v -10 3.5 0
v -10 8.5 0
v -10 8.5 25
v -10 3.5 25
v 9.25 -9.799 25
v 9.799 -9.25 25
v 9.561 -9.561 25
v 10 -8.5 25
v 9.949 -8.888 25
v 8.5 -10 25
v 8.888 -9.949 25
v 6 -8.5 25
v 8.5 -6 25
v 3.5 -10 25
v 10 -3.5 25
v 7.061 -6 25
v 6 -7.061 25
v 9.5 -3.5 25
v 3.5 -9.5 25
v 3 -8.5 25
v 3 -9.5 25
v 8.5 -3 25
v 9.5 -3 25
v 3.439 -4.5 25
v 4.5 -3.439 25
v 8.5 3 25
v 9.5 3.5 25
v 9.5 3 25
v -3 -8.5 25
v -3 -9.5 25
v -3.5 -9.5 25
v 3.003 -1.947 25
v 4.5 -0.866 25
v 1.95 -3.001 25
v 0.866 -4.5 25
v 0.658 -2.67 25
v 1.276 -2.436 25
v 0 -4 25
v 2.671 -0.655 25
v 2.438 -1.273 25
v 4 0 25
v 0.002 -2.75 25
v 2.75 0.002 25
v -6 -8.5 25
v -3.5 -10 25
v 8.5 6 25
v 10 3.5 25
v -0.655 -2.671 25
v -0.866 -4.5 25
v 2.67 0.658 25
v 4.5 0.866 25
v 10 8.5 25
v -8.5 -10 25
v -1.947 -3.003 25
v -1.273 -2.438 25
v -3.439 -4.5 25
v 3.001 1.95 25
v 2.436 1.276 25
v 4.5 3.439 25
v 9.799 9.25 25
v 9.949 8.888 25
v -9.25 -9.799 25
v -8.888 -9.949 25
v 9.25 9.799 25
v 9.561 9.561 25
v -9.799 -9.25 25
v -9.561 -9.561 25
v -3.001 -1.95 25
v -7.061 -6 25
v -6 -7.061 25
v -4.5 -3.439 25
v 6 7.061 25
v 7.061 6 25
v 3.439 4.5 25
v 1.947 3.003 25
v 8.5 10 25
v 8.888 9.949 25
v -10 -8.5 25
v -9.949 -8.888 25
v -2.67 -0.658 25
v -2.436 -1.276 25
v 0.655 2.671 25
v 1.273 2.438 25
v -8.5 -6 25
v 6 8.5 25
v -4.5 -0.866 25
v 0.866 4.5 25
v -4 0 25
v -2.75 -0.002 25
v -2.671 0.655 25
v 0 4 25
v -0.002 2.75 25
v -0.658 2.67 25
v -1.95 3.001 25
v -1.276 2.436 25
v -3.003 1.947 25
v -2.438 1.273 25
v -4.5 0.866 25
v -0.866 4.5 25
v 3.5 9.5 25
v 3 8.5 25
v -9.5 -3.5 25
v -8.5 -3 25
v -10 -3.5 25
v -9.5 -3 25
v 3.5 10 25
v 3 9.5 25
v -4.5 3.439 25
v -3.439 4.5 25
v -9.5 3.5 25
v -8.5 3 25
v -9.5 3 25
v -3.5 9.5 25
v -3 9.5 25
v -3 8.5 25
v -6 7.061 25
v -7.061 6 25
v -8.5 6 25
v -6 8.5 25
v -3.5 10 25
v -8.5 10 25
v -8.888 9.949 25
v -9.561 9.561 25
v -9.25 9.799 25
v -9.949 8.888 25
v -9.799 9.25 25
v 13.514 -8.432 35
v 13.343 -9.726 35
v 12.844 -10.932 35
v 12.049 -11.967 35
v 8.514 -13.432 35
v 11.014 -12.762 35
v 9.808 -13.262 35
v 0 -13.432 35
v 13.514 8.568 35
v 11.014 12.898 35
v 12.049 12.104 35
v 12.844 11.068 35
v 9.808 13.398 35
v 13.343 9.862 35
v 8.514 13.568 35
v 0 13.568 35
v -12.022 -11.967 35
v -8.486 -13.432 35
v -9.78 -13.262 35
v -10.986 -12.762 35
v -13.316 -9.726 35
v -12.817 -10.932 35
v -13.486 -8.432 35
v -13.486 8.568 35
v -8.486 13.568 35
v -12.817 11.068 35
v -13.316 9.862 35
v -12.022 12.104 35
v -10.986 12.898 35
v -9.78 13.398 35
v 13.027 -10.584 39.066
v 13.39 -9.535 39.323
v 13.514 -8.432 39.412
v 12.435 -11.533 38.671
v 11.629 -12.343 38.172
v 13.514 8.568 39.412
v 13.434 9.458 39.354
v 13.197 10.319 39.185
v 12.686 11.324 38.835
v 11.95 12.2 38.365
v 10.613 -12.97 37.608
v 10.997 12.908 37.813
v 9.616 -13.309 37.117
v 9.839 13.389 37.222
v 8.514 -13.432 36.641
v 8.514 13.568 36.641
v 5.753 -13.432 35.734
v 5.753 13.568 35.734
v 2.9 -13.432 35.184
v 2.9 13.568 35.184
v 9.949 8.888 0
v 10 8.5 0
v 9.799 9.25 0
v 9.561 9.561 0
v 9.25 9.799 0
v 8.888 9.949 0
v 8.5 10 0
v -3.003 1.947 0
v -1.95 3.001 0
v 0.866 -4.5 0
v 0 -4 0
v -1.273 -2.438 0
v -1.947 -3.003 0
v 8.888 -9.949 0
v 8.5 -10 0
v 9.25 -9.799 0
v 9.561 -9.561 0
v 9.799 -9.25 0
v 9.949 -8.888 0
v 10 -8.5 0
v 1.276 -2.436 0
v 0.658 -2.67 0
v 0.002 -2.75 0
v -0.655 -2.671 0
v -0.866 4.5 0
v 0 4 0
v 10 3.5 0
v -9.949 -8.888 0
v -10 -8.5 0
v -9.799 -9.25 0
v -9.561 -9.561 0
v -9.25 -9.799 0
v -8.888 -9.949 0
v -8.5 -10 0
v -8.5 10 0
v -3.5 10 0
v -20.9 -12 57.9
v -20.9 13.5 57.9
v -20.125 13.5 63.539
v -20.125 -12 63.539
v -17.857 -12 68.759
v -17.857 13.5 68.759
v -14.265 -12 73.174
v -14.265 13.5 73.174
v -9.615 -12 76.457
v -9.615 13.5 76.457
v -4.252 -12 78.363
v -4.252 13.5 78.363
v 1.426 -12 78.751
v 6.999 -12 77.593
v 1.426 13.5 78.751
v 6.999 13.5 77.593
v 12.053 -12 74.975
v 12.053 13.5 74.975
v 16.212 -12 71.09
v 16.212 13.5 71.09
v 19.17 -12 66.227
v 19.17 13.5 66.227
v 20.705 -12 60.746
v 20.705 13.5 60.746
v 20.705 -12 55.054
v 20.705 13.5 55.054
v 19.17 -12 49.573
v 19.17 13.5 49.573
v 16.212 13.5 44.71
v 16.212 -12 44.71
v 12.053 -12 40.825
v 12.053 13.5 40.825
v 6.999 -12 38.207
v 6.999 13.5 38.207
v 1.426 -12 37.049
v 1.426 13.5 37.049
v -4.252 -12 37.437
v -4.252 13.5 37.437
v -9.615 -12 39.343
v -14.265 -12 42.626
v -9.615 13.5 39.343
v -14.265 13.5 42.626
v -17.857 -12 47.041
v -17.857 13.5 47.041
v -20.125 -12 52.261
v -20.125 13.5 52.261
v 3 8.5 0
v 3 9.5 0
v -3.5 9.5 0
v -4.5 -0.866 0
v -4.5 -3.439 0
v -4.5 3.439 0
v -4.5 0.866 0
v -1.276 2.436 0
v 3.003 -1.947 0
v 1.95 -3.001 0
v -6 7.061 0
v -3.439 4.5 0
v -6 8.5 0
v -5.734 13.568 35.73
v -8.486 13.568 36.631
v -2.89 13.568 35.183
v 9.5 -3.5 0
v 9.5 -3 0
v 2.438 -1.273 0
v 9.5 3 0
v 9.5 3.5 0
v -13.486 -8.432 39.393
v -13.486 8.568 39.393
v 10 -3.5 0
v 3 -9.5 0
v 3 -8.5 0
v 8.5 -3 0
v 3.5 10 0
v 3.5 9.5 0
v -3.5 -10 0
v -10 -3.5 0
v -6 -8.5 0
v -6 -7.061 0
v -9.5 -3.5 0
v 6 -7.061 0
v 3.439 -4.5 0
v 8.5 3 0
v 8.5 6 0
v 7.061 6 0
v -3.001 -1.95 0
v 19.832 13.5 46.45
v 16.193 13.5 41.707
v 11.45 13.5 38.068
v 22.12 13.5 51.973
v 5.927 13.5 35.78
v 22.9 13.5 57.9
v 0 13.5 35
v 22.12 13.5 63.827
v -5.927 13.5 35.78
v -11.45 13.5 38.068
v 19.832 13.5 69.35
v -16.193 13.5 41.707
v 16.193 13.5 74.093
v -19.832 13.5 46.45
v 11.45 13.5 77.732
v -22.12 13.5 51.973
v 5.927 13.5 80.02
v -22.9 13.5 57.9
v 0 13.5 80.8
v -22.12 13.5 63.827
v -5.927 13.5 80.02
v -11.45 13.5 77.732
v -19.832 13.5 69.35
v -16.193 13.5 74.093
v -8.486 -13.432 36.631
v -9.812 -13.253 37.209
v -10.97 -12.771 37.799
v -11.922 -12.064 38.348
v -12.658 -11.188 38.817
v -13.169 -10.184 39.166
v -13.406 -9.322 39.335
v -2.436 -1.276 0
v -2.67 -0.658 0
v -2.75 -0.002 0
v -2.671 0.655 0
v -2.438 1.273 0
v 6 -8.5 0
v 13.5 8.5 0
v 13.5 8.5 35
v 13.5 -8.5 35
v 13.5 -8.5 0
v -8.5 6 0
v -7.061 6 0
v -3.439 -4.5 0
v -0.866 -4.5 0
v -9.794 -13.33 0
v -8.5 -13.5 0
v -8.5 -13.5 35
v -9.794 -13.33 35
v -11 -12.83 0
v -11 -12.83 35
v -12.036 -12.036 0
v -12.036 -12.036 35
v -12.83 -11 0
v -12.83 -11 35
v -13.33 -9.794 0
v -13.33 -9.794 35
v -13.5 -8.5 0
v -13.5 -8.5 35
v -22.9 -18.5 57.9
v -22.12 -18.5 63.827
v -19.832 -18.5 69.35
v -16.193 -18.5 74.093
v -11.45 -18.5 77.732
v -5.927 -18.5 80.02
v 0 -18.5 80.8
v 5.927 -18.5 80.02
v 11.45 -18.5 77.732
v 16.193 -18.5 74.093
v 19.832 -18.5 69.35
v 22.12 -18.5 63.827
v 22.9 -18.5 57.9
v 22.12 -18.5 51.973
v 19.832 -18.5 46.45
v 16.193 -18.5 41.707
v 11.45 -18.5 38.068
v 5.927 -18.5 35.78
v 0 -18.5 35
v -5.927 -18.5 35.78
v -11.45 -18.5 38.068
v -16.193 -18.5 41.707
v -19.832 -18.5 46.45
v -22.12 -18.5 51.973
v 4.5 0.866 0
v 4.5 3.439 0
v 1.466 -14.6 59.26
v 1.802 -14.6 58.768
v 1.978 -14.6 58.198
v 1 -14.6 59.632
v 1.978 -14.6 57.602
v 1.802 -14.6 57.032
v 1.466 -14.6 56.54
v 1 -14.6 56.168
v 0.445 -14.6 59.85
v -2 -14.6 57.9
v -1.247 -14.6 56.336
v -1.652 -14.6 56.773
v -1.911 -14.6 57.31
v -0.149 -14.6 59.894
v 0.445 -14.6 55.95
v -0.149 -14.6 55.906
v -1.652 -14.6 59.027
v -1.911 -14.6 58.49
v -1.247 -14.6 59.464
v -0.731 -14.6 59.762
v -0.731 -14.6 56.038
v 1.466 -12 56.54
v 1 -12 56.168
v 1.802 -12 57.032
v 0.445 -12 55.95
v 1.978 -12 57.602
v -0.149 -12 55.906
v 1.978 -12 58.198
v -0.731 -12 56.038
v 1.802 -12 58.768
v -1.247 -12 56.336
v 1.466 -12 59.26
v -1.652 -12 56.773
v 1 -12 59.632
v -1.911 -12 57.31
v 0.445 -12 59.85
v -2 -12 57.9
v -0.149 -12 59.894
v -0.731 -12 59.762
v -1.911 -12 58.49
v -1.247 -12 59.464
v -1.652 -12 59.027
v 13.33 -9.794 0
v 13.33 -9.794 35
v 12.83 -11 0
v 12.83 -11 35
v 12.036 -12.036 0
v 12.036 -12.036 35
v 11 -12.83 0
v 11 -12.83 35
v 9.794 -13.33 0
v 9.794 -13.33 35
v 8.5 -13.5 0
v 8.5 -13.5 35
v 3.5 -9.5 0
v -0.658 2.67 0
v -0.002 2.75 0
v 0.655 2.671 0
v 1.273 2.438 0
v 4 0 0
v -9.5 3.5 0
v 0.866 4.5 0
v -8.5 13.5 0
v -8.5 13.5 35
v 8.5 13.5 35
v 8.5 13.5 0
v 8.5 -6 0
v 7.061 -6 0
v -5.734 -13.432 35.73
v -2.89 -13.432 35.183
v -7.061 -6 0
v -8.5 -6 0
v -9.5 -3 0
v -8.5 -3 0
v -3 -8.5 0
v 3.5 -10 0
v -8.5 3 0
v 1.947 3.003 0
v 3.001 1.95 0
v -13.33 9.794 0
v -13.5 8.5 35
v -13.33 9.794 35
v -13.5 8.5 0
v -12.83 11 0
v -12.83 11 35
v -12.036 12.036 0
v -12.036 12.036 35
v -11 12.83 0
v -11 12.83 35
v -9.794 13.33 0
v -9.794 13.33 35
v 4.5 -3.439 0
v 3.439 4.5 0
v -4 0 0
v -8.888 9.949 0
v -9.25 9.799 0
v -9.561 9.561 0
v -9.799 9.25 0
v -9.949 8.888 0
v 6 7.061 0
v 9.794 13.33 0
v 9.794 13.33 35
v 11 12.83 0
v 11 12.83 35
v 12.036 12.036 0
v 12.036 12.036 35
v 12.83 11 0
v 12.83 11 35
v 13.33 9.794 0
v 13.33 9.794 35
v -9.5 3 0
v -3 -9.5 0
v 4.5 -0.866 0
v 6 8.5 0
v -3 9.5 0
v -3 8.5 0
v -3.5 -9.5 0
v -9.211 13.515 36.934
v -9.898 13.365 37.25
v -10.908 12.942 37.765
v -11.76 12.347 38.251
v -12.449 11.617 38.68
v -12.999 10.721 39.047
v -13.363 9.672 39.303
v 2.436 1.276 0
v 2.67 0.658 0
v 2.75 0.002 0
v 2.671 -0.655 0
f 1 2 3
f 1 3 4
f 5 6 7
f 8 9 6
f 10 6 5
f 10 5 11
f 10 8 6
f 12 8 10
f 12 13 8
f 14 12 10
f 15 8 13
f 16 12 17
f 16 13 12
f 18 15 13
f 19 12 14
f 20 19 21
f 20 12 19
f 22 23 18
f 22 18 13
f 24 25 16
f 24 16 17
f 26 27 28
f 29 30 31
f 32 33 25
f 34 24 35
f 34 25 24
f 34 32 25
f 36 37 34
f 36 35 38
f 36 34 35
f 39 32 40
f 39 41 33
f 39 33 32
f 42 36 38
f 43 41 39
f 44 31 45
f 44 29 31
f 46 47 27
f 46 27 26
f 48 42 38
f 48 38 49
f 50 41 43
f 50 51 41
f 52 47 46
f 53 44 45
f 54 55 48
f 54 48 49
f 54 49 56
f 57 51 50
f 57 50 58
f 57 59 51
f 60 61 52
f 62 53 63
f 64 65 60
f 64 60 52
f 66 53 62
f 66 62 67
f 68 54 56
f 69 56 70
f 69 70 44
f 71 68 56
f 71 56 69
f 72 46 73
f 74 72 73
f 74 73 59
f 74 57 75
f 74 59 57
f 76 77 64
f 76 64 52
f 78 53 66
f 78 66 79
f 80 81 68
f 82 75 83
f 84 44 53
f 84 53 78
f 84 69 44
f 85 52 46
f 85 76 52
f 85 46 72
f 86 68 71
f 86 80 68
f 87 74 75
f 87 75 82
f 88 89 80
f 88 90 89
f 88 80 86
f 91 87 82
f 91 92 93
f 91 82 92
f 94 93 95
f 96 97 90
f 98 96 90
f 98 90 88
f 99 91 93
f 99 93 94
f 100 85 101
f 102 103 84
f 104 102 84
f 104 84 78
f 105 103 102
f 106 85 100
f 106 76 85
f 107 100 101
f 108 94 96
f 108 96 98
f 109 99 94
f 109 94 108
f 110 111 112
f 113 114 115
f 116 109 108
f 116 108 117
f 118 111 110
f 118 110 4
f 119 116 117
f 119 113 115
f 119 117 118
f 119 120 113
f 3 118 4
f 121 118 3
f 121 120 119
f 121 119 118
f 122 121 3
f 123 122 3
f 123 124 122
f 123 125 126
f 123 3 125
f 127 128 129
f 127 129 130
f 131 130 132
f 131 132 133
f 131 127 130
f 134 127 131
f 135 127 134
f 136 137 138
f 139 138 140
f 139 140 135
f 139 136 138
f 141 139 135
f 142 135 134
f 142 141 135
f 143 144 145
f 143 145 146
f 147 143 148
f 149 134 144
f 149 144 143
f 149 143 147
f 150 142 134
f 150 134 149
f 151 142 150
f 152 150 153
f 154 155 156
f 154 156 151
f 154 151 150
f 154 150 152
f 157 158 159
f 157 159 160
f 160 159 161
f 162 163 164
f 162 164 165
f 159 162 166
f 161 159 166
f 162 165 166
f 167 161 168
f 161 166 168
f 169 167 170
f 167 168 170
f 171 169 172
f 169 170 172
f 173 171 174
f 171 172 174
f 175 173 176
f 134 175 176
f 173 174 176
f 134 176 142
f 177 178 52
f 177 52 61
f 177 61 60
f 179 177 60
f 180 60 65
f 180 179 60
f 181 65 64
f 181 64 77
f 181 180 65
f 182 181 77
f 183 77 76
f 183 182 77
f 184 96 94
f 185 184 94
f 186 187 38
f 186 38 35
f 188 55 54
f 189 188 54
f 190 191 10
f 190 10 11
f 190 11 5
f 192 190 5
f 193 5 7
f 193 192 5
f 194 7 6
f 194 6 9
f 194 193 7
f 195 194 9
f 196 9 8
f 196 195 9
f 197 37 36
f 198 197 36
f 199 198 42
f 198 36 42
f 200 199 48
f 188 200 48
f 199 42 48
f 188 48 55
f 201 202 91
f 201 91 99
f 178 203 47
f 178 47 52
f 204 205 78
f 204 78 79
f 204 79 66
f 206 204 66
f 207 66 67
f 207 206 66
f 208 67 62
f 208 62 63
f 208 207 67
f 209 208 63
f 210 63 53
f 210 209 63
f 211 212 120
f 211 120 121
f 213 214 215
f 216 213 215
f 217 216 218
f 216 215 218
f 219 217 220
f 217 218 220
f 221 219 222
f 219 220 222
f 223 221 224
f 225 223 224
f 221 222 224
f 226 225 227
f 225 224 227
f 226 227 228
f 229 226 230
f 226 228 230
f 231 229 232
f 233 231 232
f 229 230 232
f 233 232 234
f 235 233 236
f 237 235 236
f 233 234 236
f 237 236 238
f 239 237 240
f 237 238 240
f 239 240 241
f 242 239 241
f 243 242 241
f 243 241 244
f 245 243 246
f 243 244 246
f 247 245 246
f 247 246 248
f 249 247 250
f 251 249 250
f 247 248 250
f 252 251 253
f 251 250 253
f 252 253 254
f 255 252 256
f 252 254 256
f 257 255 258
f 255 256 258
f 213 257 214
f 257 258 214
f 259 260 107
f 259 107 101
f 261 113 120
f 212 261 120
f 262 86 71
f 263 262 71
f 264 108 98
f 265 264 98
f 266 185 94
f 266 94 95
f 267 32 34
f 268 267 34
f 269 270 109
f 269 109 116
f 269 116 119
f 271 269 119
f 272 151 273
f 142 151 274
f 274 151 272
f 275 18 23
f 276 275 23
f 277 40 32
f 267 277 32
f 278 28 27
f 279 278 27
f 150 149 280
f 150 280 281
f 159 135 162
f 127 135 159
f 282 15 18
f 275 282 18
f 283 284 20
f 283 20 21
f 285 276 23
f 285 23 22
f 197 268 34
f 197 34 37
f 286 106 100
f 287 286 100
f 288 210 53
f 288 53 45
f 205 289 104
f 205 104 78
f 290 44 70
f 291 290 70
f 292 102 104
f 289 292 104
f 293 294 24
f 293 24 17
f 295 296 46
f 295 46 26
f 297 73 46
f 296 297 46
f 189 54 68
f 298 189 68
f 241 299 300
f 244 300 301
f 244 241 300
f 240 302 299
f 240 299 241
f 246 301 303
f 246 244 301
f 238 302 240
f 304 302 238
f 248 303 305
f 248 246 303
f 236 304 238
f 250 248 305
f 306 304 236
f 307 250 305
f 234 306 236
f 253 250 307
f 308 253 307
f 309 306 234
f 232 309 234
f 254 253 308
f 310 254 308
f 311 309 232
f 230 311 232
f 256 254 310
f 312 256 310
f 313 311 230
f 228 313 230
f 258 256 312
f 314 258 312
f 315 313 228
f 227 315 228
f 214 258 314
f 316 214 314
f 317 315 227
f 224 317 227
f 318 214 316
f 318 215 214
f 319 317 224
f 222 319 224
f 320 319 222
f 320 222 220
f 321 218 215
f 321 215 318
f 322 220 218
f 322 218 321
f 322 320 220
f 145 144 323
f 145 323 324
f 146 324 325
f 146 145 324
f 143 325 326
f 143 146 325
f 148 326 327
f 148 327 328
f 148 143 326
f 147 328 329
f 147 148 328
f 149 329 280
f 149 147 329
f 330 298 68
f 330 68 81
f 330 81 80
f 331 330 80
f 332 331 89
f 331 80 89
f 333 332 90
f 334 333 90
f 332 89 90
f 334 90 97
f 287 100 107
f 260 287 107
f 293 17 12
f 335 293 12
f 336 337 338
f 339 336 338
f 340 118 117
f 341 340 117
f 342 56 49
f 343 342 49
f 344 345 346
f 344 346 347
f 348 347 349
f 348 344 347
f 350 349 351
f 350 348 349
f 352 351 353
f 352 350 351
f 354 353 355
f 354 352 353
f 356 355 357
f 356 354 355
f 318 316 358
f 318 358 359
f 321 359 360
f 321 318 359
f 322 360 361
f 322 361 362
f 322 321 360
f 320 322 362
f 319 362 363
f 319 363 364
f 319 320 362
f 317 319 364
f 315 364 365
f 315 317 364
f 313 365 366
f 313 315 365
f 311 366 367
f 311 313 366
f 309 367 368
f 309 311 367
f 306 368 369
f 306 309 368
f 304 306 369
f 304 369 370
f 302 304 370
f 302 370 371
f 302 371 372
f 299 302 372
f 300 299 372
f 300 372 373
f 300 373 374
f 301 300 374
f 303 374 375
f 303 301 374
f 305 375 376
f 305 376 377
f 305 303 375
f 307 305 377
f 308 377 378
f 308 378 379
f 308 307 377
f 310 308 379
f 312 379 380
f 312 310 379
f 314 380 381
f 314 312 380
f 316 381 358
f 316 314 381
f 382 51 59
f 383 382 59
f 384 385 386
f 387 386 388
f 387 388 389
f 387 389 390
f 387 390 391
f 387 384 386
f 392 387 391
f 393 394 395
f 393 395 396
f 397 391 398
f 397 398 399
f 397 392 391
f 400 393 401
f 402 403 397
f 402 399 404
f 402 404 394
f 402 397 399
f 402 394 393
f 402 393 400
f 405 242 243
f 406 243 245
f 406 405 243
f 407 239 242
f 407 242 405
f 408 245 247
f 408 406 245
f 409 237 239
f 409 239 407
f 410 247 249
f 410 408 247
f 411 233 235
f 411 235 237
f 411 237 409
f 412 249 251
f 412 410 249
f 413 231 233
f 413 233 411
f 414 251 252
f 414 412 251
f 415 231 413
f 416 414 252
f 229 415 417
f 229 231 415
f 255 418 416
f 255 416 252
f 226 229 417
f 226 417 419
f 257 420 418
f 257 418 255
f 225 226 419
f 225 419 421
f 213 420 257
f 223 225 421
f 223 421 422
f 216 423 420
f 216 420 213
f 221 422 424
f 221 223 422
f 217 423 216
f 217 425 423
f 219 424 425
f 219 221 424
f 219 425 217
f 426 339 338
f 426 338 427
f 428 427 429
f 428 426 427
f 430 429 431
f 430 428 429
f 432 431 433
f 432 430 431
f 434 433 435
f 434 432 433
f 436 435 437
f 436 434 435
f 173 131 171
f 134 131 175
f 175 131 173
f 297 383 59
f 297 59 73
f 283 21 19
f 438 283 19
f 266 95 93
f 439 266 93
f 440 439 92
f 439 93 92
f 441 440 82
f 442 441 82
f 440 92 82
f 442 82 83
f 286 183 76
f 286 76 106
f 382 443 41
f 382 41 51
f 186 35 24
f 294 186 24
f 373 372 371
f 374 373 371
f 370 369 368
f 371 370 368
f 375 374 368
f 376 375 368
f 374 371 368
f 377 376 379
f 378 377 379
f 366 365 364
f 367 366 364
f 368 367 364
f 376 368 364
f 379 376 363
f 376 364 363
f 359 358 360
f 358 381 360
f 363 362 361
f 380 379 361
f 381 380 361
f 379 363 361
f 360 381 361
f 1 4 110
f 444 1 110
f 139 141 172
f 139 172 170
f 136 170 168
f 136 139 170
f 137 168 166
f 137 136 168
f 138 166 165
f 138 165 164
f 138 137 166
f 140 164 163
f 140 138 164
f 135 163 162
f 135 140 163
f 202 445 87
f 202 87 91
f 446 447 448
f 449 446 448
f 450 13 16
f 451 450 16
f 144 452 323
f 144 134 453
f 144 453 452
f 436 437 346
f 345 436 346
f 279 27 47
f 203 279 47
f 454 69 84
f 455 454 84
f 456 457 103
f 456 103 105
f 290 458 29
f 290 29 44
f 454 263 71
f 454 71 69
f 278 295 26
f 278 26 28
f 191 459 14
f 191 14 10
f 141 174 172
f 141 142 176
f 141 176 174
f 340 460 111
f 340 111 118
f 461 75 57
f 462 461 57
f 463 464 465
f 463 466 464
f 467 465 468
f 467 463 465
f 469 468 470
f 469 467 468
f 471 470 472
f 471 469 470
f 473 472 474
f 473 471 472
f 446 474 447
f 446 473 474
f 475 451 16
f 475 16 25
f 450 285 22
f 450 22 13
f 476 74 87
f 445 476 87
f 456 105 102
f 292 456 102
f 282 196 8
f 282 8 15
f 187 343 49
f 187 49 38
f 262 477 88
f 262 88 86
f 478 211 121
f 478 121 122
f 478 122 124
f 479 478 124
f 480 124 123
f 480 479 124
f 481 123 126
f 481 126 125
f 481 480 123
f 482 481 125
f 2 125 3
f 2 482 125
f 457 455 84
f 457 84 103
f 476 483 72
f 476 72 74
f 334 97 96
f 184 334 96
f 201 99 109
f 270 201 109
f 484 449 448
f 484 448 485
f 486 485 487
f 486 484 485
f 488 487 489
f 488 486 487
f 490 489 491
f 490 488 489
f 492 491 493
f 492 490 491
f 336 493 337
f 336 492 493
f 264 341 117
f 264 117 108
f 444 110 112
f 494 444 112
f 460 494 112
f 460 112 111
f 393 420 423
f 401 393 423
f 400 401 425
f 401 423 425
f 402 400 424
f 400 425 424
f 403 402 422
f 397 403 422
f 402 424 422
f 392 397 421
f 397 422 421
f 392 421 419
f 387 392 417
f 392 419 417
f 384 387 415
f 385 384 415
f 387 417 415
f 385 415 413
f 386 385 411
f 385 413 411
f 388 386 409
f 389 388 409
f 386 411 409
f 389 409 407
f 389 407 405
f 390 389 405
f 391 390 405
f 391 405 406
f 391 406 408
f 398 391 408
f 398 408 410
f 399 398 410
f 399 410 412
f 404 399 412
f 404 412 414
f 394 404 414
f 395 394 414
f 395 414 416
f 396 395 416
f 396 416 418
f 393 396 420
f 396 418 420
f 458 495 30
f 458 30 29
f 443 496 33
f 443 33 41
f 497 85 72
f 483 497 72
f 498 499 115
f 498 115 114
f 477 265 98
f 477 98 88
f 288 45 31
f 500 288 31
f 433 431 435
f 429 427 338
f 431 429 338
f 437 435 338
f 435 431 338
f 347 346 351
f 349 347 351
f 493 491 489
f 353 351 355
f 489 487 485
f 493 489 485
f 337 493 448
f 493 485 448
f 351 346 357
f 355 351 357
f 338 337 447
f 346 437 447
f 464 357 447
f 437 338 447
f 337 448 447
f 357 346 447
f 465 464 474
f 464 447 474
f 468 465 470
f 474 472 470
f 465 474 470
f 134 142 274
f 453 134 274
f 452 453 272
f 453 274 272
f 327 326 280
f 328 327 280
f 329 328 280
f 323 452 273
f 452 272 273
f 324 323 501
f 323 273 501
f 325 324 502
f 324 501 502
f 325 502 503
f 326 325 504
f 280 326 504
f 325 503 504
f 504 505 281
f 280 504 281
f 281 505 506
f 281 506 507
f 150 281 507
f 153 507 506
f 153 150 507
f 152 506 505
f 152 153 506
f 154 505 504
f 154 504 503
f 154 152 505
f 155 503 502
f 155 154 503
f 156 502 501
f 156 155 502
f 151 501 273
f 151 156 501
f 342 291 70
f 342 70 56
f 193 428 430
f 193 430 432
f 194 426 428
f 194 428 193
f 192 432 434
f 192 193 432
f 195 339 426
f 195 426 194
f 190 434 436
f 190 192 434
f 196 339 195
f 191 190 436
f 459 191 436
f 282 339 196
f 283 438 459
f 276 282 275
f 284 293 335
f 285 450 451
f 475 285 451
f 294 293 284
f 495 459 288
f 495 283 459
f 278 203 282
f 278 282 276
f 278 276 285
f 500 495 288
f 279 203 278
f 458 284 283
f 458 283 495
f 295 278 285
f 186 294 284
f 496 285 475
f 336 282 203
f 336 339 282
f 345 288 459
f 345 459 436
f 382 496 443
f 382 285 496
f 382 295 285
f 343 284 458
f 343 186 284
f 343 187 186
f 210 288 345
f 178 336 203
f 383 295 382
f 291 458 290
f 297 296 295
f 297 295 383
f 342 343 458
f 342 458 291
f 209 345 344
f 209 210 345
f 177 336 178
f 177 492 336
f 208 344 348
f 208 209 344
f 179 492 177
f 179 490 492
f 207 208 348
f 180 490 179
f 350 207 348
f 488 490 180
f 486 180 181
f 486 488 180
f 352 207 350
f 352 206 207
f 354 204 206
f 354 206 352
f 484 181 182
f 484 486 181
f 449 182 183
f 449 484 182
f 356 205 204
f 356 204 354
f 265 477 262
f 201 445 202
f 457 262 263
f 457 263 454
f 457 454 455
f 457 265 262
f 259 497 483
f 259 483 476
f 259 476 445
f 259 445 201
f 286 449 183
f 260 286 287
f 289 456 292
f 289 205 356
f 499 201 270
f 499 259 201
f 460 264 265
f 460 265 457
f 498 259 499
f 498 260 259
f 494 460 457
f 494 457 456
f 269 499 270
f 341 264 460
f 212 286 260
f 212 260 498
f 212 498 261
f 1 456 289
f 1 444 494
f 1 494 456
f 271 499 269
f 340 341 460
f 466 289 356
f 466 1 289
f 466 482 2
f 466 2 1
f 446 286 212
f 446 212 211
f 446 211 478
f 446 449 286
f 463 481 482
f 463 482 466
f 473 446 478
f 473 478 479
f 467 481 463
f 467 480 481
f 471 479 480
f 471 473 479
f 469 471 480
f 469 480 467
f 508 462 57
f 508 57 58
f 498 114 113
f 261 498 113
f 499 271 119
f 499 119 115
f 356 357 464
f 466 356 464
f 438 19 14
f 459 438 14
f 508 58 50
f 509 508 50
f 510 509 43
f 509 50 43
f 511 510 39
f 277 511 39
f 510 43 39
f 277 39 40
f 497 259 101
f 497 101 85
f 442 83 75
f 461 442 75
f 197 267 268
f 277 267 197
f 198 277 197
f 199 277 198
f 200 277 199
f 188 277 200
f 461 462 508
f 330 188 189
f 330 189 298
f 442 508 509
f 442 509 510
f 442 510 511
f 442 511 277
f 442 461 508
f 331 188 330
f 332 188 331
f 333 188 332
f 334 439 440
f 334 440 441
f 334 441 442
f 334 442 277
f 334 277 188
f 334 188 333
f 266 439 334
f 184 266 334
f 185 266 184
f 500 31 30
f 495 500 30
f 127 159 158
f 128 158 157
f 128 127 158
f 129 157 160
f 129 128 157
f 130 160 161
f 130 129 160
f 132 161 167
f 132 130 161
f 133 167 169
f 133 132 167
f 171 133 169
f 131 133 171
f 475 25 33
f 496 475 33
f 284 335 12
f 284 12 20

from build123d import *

# Parameters (mm, degrees)
BOSS_EXTRU_1_DEPTH      = 25
BOSS_EXTRU_2_DEPTH      = 10
ESQUISSE4_R             = 22.9
BOSS_EXTRU_3_DEPTH      = 32
BOSS_EXTRU_5_REACH      = 56.445
BOSS_EXTRU_5_END_RADIUS = 22.9
ESQUISSE6_R             = 20.9
ENL_V_MAT_EXTRU_1_DEPTH = 25.5
ESQUISSE8_R             = 2
ENL_V_MAT_EXTRU_3_DEPTH = 2.6
BOSS_EXTRU_6_START      = -25
BOSS_EXTRU_6_DEPTH      = 25


# Read off the part's stored shape, not the designer's step: Boss.-Extru.6
with BuildPart() as part:
    # Esquisse2 → Boss.-Extru.1 (new body)
    with BuildSketch(Plane.XY):
        with BuildLine():
            Line((13.5, 8.5), (13.5, -8.5))
            ThreePointArc((13.5, -8.5), (12.035533906, -12.035533906), (8.5, -13.5))
            Line((8.5, -13.5), (-8.5, -13.5))
            ThreePointArc((-8.5, -13.5), (-12.035533906, -12.035533906), (-13.5, -8.5))
            Line((-13.5, -8.5), (-13.5, 8.5))
            ThreePointArc((-13.5, 8.5), (-12.035533906, 12.035533906), (-8.5, 13.5))
            Line((-8.5, 13.5), (8.5, 13.5))
            ThreePointArc((8.5, 13.5), (12.035533906, 12.035533906), (13.5, 8.5))
        make_face()
        with BuildLine():
            Line((0, 4), (-0.866025404, 4.5))
            Line((-0.866025404, 4.5), (-3.439339828, 4.5))
            Line((-3.439339828, 4.5), (-6, 7.060660172))
            Line((-6, 7.060660172), (-6, 8.5))
            Line((-6, 8.5), (-3, 8.5))
            Line((-3, 8.5), (-3, 9.5))
            Line((-3, 9.5), (-3.5, 9.5))
            Line((-3.5, 9.5), (-3.5, 10))
            Line((-3.5, 10), (-8.5, 10))
            ThreePointArc((-8.5, 10), (-9.560660172, 9.560660172), (-10, 8.5))
            Line((-10, 8.5), (-10, 3.5))
            Line((-10, 3.5), (-9.5, 3.5))
            Line((-9.5, 3.5), (-9.5, 3))
            Line((-9.5, 3), (-8.5, 3))
            Line((-8.5, 3), (-8.5, 6))
            Line((-8.5, 6), (-7.060660172, 6))
            Line((-7.060660172, 6), (-4.5, 3.439339828))
            Line((-4.5, 3.439339828), (-4.5, 0.866025404))
            Line((-4.5, 0.866025404), (-4, 0))
            Line((-4, 0), (-4.5, -0.866025404))
            Line((-4.5, -0.866025404), (-4.5, -3.439339828))
            Line((-4.5, -3.439339828), (-7.060660172, -6))
            Line((-7.060660172, -6), (-8.5, -6))
            Line((-8.5, -6), (-8.5, -3))
            Line((-8.5, -3), (-9.5, -3))
            Line((-9.5, -3), (-9.5, -3.5))
            Line((-9.5, -3.5), (-10, -3.5))
            Line((-10, -3.5), (-10, -8.5))
            ThreePointArc((-10, -8.5), (-9.560660172, -9.560660172), (-8.5, -10))
            Line((-8.5, -10), (-3.5, -10))
            Line((-3.5, -10), (-3.5, -9.5))
            Line((-3.5, -9.5), (-3, -9.5))
            Line((-3, -9.5), (-3, -8.5))
            Line((-3, -8.5), (-6, -8.5))
            Line((-6, -8.5), (-6, -7.060660172))
            Line((-6, -7.060660172), (-3.439339828, -4.5))
            Line((-3.439339828, -4.5), (-0.866025404, -4.5))
            Line((-0.866025404, -4.5), (0, -4))
            Line((0, -4), (0.866025404, -4.5))
            Line((0.866025404, -4.5), (3.439339828, -4.5))
            Line((3.439339828, -4.5), (6, -7.060660172))
            Line((6, -7.060660172), (6, -8.5))
            Line((6, -8.5), (3, -8.5))
            Line((3, -8.5), (3, -9.5))
            Line((3, -9.5), (3.5, -9.5))
            Line((3.5, -9.5), (3.5, -10))
            Line((3.5, -10), (8.5, -10))
            ThreePointArc((8.5, -10), (9.560660172, -9.560660172), (10, -8.5))
            Line((10, -8.5), (10, -3.5))
            Line((10, -3.5), (9.5, -3.5))
            Line((9.5, -3.5), (9.5, -3))
            Line((9.5, -3), (8.5, -3))
            Line((8.5, -3), (8.5, -6))
            Line((8.5, -6), (7.060660172, -6))
            Line((7.060660172, -6), (4.5, -3.439339828))
            Line((4.5, -3.439339828), (4.5, -0.866025404))
            Line((4.5, -0.866025404), (4, 0))
            Line((4, 0), (4.5, 0.866025404))
            Line((4.5, 0.866025404), (4.5, 3.439339828))
            Line((4.5, 3.439339828), (7.060660172, 6))
            Line((7.060660172, 6), (8.5, 6))
            Line((8.5, 6), (8.5, 3))
            Line((8.5, 3), (9.5, 3))
            Line((9.5, 3), (9.5, 3.5))
            Line((9.5, 3.5), (10, 3.5))
            Line((10, 3.5), (10, 8.5))
            ThreePointArc((10, 8.5), (9.560660172, 9.560660172), (8.5, 10))
            Line((8.5, 10), (3.5, 10))
            Line((3.5, 10), (3.5, 9.5))
            Line((3.5, 9.5), (3, 9.5))
            Line((3, 9.5), (3, 8.5))
            Line((3, 8.5), (6, 8.5))
            Line((6, 8.5), (6, 7.060660172))
            Line((6, 7.060660172), (3.439339828, 4.5))
            Line((3.439339828, 4.5), (0.866025404, 4.5))
            Line((0.866025404, 4.5), (0, 4))
        make_face(mode=Mode.SUBTRACT)
    extrude(amount=BOSS_EXTRU_1_DEPTH)

    # Esquisse3 → Boss.-Extru.2 (add)
    with BuildSketch(Plane.XY.offset(25)):
        with BuildLine():
            Line((-8.5, 13.5), (8.5, 13.5))
            ThreePointArc((8.5, 13.5), (12.035533906, 12.035533906), (13.5, 8.5))
            Line((13.5, 8.5), (13.5, -8.5))
            ThreePointArc((13.5, -8.5), (12.035533906, -12.035533906), (8.5, -13.5))
            Line((8.5, -13.5), (-8.5, -13.5))
            ThreePointArc((-8.5, -13.5), (-12.035533906, -12.035533906), (-13.5, -8.5))
            Line((-13.5, -8.5), (-13.5, 8.5))
            ThreePointArc((-13.5, 8.5), (-12.035533906, 12.035533906), (-8.5, 13.5))
        make_face()
    extrude(amount=BOSS_EXTRU_2_DEPTH)

    # Boss.-Extru.6 outline → Boss.-Extru.6 (add)
    with BuildSketch(Plane(origin=(0, 0, 0), x_dir=(-1, 0, 0), z_dir=(0, 0, -1)).offset(BOSS_EXTRU_6_START)):
        with BuildLine():
            Line((-1.273167982, 2.43752811), (-1.947287092, 3.003181207))
            Line((-1.947287092, 3.003181207), (-3.000876196, 1.949592103))
            Line((-3.000876196, 1.949592103), (-2.435900169, 1.276279893))
            ThreePointArc((-2.435900169, 1.276279893), (-2.749999439, 0.001756003), (-2.43752811, -1.273167982))
            Line((-2.43752811, -1.273167982), (-3.003181207, -1.947287092))
            Line((-3.003181207, -1.947287092), (-1.949592103, -3.000876196))
            Line((-1.949592103, -3.000876196), (-1.276279893, -2.435900169))
            ThreePointArc((-1.276279893, -2.435900169), (-0.001756003, -2.749999439), (1.273167982, -2.43752811))
            Line((1.273167982, -2.43752811), (1.947287092, -3.003181207))
            Line((1.947287092, -3.003181207), (3.000876196, -1.949592103))
            Line((3.000876196, -1.949592103), (2.435900169, -1.276279893))
            ThreePointArc((2.435900169, -1.276279893), (2.749999439, -0.001756003), (2.43752811, 1.273167982))
            Line((2.43752811, 1.273167982), (3.003181207, 1.947287092))
            Line((3.003181207, 1.947287092), (1.949592103, 3.000876196))
            Line((1.949592103, 3.000876196), (1.276279893, 2.435900169))
            ThreePointArc((1.276279893, 2.435900169), (0.001756003, 2.749999439), (-1.273167982, 2.43752811))
        make_face()
    extrude(amount=BOSS_EXTRU_6_DEPTH)


with BuildPart() as body_2:
    # Esquisse4 → Boss.-Extru.3 (new body)
    with BuildSketch(Plane(origin=(0, 13.5, 0), x_dir=(1, 0, 0), z_dir=(0, 1, 0))):
        with Locations(Location((0, -57.9, 0), (0, 0, 180))):
            Circle(ESQUISSE4_R)
    extrude(amount=-BOSS_EXTRU_3_DEPTH)

    # Esquisse6 → Enlèv. mat.-Extru.1 (cut)
    with BuildSketch(Plane(origin=(0, 13.5, 0), x_dir=(1, 0, 0), z_dir=(0, 1, 0))):
        with Locations(Location((0, -57.9, 0), (0, 0, 180))):
            Circle(ESQUISSE6_R)
    extrude(amount=-ENL_V_MAT_EXTRU_1_DEPTH, mode=Mode.SUBTRACT)

    # Esquisse8 → Enlèv. mat.-Extru.3 (cut)
    with BuildSketch(Plane(origin=(0, -12, 0), x_dir=(1, 0, 0), z_dir=(0, 1, 0))):
        with Locations(Location((0, -57.9, 0), (0, 0, 180))):
            Circle(ESQUISSE8_R)
    extrude(amount=-ENL_V_MAT_EXTRU_3_DEPTH, mode=Mode.SUBTRACT)


with BuildPart() as body_3:
    # Boss.-Extru.5: up to this cylinder (the profile starts outside it)
    boss_extru_5_end = Plane(origin=(0, 0.068098, 57.9), z_dir=(0, 1, 0)) * Cylinder(BOSS_EXTRU_5_END_RADIUS, 159.69, mode=Mode.PRIVATE)
    # Esquisse5 → Boss.-Extru.5 (new, up to the surface)
    with BuildSketch(Plane.XY.offset(35), mode=Mode.PRIVATE) as boss_extru_5_sk1:
        with BuildLine():
            Line((-8.486380485, 13.568097576), (8.513619515, 13.568097576))
            ThreePointArc((8.513619515, 13.568097576), (12.049153421, 12.103631482), (13.513619515, 8.568097576))
            Line((13.513619515, 8.568097576), (13.513619515, -8.431902424))
            ThreePointArc((13.513619515, -8.431902424), (12.049153421, -11.96743633), (8.513619515, -13.431902424))
            Line((8.513619515, -13.431902424), (-8.486380485, -13.431902424))
            ThreePointArc((-8.486380485, -13.431902424), (-12.021914391, -11.96743633), (-13.486380485, -8.431902424))
            Line((-13.486380485, -8.431902424), (-13.486380485, 8.568097576))
            ThreePointArc((-13.486380485, 8.568097576), (-12.021914391, 12.103631482), (-8.486380485, 13.568097576))
        make_face()
    boss_extru_5_tool1 = extrude(boss_extru_5_sk1.sketch, amount=BOSS_EXTRU_5_REACH, mode=Mode.PRIVATE) - boss_extru_5_end
    add(boss_extru_5_tool1.solids().sort_by_distance((0.01362, 0.068098, 35))[0])
    add(boss_extru_5_tool1.solids().sort_by_distance((0.01362, 0.068098, 35))[1])


solid = Compound([part.part, body_2.part, body_3.part])
